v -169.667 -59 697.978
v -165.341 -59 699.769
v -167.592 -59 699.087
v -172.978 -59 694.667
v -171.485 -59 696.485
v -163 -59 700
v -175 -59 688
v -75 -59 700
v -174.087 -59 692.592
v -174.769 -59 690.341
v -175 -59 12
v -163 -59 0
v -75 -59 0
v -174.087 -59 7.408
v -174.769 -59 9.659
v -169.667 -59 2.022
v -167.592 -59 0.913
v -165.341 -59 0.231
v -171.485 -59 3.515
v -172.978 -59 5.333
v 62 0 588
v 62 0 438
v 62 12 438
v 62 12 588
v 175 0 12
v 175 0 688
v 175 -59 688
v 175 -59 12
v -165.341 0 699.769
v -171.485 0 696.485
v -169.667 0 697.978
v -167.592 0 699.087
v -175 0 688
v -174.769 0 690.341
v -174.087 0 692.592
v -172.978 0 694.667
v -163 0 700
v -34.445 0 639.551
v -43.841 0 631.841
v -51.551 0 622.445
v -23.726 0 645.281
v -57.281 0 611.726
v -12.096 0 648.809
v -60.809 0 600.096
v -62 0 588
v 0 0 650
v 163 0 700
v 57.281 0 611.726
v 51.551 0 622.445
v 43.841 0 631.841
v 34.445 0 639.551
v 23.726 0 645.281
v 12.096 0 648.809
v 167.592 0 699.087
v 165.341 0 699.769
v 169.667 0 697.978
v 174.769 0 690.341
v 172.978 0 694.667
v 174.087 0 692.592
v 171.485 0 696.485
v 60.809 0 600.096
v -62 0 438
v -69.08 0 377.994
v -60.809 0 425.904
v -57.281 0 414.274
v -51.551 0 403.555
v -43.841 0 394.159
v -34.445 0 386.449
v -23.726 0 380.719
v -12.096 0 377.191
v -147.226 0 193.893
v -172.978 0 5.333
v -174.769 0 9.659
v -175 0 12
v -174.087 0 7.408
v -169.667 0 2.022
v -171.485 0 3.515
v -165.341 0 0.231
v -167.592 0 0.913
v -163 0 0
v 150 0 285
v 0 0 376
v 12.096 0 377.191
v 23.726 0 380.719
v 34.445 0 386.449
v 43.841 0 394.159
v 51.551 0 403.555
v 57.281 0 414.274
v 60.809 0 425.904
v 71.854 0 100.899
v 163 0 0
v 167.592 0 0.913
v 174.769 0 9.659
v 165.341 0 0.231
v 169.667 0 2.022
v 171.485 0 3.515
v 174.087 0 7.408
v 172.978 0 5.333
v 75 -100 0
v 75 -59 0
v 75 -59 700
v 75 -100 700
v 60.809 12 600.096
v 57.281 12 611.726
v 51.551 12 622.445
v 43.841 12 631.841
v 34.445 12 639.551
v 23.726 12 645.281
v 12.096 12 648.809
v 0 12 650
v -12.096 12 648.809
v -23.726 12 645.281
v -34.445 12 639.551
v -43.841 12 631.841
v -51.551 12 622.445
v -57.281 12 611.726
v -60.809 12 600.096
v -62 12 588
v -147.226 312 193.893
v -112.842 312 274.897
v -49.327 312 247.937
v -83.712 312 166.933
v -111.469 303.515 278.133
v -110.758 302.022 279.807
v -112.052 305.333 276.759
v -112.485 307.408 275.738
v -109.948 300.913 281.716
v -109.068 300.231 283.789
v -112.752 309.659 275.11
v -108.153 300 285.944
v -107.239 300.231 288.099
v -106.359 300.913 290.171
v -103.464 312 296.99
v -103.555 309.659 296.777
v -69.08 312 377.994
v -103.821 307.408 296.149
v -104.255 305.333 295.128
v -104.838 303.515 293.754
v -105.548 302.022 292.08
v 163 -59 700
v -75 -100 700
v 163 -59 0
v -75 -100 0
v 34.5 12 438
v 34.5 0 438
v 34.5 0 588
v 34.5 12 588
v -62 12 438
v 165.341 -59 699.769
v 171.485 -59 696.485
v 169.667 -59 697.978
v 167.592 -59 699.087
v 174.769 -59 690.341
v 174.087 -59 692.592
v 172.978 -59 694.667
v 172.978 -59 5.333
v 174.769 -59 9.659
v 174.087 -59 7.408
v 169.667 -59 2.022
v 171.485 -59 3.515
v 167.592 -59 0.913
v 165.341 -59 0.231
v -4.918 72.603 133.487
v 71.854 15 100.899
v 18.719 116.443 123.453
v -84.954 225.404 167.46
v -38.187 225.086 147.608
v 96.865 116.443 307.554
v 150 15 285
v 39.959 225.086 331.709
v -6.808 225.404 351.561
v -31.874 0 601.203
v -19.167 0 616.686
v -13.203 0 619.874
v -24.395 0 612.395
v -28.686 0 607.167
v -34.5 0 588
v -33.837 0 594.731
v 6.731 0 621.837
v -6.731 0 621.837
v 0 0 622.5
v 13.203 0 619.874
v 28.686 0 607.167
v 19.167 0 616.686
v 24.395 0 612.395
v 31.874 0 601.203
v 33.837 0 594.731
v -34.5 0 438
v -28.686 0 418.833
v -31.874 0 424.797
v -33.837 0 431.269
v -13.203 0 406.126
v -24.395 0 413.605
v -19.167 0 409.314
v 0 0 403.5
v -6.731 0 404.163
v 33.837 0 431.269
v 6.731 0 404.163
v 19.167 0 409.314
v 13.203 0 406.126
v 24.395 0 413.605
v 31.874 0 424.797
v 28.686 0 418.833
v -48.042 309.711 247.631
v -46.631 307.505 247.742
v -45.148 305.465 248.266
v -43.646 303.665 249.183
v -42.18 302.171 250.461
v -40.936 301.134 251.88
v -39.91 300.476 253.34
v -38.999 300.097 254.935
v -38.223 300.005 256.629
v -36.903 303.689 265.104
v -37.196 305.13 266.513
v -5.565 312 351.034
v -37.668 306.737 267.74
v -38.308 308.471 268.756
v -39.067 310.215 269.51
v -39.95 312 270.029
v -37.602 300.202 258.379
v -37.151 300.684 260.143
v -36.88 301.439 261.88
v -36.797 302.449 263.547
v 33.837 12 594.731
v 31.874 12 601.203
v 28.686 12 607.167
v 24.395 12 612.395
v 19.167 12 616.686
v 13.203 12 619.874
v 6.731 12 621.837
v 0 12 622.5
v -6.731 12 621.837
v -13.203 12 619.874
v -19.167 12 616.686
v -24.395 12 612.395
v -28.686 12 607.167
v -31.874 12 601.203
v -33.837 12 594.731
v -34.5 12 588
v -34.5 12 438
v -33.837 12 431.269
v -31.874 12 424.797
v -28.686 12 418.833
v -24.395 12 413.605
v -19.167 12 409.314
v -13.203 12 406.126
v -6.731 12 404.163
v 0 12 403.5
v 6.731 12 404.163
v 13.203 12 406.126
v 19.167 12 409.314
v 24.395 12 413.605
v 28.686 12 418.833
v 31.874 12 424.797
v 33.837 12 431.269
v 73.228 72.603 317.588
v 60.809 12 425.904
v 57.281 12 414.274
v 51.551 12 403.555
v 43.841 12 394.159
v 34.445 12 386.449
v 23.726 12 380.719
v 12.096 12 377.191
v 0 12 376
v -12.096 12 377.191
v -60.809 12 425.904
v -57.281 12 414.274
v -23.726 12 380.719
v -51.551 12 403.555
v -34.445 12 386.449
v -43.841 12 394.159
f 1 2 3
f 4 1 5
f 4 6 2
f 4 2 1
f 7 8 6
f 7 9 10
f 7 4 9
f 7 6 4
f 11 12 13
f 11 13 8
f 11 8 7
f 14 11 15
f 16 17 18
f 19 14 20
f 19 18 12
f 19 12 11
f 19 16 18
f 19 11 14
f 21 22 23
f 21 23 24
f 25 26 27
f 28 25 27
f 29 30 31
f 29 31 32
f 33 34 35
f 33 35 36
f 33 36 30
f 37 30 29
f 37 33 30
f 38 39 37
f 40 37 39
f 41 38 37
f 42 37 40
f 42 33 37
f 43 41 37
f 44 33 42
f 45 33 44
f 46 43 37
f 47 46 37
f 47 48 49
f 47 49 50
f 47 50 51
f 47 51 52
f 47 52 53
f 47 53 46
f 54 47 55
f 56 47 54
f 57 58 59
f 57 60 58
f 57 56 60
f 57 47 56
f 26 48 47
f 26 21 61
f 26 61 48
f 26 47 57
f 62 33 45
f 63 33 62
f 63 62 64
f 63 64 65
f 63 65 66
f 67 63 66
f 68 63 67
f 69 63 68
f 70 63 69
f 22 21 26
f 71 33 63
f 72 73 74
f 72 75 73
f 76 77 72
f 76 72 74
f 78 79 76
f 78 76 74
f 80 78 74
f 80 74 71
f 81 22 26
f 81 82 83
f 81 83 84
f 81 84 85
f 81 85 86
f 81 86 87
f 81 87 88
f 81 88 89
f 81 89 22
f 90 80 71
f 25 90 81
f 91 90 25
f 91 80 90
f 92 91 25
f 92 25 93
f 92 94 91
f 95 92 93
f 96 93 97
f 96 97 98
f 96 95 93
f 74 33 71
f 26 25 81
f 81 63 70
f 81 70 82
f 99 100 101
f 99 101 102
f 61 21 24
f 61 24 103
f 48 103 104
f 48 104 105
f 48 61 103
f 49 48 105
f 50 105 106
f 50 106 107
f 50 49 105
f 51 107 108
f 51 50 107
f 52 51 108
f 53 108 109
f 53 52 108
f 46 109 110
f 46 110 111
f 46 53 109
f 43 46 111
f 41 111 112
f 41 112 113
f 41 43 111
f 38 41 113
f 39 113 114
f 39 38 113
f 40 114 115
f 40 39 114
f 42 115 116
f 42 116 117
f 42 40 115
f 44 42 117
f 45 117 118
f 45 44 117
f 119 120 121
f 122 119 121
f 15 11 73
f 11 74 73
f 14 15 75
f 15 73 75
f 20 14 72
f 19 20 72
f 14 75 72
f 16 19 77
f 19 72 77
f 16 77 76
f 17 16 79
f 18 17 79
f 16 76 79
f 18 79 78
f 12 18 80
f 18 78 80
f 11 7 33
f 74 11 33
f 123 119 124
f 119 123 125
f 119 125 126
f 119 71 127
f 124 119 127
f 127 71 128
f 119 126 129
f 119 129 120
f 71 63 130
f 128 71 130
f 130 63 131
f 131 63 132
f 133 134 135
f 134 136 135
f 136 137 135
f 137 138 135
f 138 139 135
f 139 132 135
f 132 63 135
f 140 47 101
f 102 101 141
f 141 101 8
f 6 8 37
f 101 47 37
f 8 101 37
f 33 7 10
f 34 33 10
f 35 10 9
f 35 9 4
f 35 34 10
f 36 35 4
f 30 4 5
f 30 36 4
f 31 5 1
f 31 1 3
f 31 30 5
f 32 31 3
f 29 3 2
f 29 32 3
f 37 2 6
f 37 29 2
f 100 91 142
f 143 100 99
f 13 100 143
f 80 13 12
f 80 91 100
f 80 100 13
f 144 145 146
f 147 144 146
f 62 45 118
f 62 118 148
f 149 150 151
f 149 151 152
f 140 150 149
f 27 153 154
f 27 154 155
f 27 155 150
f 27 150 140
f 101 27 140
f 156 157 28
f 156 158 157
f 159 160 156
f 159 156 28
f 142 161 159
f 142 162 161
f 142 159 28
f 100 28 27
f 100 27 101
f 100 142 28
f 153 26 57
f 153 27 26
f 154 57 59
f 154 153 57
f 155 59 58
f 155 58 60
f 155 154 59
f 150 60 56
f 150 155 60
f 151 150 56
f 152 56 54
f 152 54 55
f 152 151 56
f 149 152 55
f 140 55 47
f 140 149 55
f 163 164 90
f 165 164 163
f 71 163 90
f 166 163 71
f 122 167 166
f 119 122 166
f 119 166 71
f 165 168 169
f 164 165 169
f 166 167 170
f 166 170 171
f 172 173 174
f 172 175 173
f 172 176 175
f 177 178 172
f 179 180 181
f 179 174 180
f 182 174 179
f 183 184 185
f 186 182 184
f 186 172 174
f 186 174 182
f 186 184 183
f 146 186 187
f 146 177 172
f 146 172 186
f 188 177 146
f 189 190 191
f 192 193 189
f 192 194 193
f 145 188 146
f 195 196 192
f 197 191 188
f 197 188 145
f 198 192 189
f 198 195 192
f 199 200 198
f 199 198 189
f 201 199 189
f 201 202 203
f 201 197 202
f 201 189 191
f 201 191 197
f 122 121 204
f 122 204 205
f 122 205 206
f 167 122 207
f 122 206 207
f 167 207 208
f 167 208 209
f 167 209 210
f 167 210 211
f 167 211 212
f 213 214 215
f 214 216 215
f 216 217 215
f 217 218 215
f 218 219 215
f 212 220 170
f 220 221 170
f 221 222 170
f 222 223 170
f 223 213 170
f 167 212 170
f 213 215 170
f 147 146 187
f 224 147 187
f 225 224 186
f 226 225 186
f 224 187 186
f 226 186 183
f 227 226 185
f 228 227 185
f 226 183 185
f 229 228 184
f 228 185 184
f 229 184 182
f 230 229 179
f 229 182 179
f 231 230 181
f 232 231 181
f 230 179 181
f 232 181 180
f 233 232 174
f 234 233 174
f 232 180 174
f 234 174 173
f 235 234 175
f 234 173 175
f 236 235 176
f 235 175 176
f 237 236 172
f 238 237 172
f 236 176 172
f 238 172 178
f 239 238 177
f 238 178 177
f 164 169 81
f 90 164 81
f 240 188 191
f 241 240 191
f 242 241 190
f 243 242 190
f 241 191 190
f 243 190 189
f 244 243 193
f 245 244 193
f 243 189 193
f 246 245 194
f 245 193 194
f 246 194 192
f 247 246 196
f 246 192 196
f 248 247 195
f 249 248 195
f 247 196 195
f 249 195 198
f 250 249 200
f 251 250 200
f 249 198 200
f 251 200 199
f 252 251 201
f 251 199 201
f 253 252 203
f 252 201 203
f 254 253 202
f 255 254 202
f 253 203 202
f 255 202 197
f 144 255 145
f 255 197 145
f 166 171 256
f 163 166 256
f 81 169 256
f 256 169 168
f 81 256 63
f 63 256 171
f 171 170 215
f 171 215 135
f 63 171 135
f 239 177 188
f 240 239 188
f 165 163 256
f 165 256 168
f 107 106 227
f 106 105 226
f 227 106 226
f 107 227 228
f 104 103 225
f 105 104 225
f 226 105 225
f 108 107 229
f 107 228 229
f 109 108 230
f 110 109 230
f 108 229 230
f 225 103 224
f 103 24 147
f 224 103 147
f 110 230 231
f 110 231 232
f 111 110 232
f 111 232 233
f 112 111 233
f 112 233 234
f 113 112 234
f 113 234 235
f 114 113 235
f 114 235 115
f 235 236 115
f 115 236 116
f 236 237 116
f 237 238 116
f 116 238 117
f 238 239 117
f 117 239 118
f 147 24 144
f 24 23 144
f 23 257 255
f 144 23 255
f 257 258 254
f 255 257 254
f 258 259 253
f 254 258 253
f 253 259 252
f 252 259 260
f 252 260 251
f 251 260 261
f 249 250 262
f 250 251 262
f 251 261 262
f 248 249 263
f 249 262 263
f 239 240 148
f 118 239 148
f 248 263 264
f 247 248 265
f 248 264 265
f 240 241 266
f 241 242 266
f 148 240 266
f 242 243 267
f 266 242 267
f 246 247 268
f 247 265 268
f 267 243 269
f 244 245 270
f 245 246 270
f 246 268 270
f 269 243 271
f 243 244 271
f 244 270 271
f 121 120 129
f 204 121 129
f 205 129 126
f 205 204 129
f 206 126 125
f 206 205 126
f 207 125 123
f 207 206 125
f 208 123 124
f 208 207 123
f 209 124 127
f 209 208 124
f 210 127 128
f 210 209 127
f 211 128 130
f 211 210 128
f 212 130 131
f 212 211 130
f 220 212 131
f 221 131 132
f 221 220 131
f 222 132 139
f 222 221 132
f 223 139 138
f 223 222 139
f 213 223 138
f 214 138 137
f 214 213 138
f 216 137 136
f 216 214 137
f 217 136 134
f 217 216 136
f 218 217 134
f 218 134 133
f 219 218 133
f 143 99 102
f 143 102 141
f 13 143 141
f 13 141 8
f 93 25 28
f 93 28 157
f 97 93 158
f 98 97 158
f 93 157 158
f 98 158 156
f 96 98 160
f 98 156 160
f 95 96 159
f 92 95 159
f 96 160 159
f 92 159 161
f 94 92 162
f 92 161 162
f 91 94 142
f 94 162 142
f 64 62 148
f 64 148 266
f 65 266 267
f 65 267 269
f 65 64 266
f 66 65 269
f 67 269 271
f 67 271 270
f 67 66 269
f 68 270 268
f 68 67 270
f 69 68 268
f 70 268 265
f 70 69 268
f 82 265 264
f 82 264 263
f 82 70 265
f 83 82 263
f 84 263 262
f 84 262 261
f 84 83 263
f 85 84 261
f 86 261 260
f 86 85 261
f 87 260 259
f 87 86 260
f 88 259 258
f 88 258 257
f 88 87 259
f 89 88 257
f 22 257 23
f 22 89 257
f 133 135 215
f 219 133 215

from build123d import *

# Parameters (mm, degrees)
BOSS_EXTRUDE1_DEPTH     = 700
FILLET1_R               = 12
BOSS_EXTRUDE2_DEPTH     = 12
BOSS_EXTRUDE3_DEPTH     = 200
CUT_EXTRUDE1_DEPTH      = 785.28509614
CUT_EXTRUDE1_DEPTH_BACK = 785.28509614


with BuildPart() as part:
    # Sketch1 → Boss-Extrude1 (new body)
    with BuildSketch(Plane.XY):
        Polygon((-175, 0), (175, 0), (175, -59), (75, -59), (75, -100), (-75, -100), (-75, -59), (-175, -59), align=None)
    extrude(amount=BOSS_EXTRUDE1_DEPTH)

    # Fillet1
    fillet1_edges = [part.edges().sort_by_distance(p)[0] for p in [
        (-175, -29.5, 0),
        (175, -29.5, 700),
        (-175, -29.5, 700),
        (175, -29.5, 0),
    ]]
    fillet(fillet1_edges, radius=FILLET1_R)

    # Sketch2 → Boss-Extrude2 (add)
    with BuildSketch(Plane(origin=(0, 0, 0), x_dir=(1, 0, 0), z_dir=(0, 1, 0))):
        with BuildLine():
            Line((-62, -588), (-62, -438))
            ThreePointArc((-62, -438), (0, -376), (62, -438))
            Line((62, -438), (62, -588))
            ThreePointArc((62, -588), (0, -650), (-62, -588))
        make_face()
        with BuildLine():
            Line((-34.5, -588), (-34.5, -438))
            ThreePointArc((-34.5, -438), (0, -403.5), (34.5, -438))
            Line((34.5, -438), (34.5, -588))
            ThreePointArc((34.5, -588), (0, -622.5), (-34.5, -588))
        make_face(mode=Mode.SUBTRACT)
    extrude(amount=BOSS_EXTRUDE2_DEPTH)

    # Sketch4 → Boss-Extrude3 (add)
    with BuildSketch(Plane(origin=(125.406543764, 0, 295.439302816), x_dir=(-0.9205048534524398, 0, 0.39073112848927494), z_dir=(-0.39073112848927494, 0, -0.9205048534524398))):
        Polygon((-26.717356398, 0), (211.282643602, 0), (211.282643602, 312), (142.282643602, 312), (92.826407103, 225.085785562), (143.632232896, 225.404217347), (56.684794392, 72.60309761), (31.00611148, 116.443017514), (-26.717356398, 15), align=None)
    extrude(amount=BOSS_EXTRUDE3_DEPTH)

    # Sketch5 → Cut-Extrude1 (cut, two sides: drawn at the far end of the back side and taken through both)
    with BuildSketch(Plane(origin=(-194.486698886, 0, 82.554705765), x_dir=(0.39073112848927494, 0, 0.9205048534524398), z_dir=(-0.9205048534524398, 0, 0.39073112848927494)).offset(-CUT_EXTRUDE1_DEPTH_BACK)):
        with BuildLine():
            Line((208.953552507, 1623.592968805), (208.953552507, 312))
            ThreePointArc((208.953552507, 312), (220.953552507, 300), (232.953552507, 312))
            Line((232.953552507, 312), (232.953552507, 1623.592968805))
            Line((232.953552507, 1623.592968805), (232.953552507, 4246.778906414))
            Line((232.953552507, 4246.778906414), (208.953552507, 4246.778906414))
            Line((208.953552507, 4246.778906414), (208.953552507, 1623.592968805))
        make_face()
    extrude(amount=CUT_EXTRUDE1_DEPTH + CUT_EXTRUDE1_DEPTH_BACK, mode=Mode.SUBTRACT)


solid = part.part
